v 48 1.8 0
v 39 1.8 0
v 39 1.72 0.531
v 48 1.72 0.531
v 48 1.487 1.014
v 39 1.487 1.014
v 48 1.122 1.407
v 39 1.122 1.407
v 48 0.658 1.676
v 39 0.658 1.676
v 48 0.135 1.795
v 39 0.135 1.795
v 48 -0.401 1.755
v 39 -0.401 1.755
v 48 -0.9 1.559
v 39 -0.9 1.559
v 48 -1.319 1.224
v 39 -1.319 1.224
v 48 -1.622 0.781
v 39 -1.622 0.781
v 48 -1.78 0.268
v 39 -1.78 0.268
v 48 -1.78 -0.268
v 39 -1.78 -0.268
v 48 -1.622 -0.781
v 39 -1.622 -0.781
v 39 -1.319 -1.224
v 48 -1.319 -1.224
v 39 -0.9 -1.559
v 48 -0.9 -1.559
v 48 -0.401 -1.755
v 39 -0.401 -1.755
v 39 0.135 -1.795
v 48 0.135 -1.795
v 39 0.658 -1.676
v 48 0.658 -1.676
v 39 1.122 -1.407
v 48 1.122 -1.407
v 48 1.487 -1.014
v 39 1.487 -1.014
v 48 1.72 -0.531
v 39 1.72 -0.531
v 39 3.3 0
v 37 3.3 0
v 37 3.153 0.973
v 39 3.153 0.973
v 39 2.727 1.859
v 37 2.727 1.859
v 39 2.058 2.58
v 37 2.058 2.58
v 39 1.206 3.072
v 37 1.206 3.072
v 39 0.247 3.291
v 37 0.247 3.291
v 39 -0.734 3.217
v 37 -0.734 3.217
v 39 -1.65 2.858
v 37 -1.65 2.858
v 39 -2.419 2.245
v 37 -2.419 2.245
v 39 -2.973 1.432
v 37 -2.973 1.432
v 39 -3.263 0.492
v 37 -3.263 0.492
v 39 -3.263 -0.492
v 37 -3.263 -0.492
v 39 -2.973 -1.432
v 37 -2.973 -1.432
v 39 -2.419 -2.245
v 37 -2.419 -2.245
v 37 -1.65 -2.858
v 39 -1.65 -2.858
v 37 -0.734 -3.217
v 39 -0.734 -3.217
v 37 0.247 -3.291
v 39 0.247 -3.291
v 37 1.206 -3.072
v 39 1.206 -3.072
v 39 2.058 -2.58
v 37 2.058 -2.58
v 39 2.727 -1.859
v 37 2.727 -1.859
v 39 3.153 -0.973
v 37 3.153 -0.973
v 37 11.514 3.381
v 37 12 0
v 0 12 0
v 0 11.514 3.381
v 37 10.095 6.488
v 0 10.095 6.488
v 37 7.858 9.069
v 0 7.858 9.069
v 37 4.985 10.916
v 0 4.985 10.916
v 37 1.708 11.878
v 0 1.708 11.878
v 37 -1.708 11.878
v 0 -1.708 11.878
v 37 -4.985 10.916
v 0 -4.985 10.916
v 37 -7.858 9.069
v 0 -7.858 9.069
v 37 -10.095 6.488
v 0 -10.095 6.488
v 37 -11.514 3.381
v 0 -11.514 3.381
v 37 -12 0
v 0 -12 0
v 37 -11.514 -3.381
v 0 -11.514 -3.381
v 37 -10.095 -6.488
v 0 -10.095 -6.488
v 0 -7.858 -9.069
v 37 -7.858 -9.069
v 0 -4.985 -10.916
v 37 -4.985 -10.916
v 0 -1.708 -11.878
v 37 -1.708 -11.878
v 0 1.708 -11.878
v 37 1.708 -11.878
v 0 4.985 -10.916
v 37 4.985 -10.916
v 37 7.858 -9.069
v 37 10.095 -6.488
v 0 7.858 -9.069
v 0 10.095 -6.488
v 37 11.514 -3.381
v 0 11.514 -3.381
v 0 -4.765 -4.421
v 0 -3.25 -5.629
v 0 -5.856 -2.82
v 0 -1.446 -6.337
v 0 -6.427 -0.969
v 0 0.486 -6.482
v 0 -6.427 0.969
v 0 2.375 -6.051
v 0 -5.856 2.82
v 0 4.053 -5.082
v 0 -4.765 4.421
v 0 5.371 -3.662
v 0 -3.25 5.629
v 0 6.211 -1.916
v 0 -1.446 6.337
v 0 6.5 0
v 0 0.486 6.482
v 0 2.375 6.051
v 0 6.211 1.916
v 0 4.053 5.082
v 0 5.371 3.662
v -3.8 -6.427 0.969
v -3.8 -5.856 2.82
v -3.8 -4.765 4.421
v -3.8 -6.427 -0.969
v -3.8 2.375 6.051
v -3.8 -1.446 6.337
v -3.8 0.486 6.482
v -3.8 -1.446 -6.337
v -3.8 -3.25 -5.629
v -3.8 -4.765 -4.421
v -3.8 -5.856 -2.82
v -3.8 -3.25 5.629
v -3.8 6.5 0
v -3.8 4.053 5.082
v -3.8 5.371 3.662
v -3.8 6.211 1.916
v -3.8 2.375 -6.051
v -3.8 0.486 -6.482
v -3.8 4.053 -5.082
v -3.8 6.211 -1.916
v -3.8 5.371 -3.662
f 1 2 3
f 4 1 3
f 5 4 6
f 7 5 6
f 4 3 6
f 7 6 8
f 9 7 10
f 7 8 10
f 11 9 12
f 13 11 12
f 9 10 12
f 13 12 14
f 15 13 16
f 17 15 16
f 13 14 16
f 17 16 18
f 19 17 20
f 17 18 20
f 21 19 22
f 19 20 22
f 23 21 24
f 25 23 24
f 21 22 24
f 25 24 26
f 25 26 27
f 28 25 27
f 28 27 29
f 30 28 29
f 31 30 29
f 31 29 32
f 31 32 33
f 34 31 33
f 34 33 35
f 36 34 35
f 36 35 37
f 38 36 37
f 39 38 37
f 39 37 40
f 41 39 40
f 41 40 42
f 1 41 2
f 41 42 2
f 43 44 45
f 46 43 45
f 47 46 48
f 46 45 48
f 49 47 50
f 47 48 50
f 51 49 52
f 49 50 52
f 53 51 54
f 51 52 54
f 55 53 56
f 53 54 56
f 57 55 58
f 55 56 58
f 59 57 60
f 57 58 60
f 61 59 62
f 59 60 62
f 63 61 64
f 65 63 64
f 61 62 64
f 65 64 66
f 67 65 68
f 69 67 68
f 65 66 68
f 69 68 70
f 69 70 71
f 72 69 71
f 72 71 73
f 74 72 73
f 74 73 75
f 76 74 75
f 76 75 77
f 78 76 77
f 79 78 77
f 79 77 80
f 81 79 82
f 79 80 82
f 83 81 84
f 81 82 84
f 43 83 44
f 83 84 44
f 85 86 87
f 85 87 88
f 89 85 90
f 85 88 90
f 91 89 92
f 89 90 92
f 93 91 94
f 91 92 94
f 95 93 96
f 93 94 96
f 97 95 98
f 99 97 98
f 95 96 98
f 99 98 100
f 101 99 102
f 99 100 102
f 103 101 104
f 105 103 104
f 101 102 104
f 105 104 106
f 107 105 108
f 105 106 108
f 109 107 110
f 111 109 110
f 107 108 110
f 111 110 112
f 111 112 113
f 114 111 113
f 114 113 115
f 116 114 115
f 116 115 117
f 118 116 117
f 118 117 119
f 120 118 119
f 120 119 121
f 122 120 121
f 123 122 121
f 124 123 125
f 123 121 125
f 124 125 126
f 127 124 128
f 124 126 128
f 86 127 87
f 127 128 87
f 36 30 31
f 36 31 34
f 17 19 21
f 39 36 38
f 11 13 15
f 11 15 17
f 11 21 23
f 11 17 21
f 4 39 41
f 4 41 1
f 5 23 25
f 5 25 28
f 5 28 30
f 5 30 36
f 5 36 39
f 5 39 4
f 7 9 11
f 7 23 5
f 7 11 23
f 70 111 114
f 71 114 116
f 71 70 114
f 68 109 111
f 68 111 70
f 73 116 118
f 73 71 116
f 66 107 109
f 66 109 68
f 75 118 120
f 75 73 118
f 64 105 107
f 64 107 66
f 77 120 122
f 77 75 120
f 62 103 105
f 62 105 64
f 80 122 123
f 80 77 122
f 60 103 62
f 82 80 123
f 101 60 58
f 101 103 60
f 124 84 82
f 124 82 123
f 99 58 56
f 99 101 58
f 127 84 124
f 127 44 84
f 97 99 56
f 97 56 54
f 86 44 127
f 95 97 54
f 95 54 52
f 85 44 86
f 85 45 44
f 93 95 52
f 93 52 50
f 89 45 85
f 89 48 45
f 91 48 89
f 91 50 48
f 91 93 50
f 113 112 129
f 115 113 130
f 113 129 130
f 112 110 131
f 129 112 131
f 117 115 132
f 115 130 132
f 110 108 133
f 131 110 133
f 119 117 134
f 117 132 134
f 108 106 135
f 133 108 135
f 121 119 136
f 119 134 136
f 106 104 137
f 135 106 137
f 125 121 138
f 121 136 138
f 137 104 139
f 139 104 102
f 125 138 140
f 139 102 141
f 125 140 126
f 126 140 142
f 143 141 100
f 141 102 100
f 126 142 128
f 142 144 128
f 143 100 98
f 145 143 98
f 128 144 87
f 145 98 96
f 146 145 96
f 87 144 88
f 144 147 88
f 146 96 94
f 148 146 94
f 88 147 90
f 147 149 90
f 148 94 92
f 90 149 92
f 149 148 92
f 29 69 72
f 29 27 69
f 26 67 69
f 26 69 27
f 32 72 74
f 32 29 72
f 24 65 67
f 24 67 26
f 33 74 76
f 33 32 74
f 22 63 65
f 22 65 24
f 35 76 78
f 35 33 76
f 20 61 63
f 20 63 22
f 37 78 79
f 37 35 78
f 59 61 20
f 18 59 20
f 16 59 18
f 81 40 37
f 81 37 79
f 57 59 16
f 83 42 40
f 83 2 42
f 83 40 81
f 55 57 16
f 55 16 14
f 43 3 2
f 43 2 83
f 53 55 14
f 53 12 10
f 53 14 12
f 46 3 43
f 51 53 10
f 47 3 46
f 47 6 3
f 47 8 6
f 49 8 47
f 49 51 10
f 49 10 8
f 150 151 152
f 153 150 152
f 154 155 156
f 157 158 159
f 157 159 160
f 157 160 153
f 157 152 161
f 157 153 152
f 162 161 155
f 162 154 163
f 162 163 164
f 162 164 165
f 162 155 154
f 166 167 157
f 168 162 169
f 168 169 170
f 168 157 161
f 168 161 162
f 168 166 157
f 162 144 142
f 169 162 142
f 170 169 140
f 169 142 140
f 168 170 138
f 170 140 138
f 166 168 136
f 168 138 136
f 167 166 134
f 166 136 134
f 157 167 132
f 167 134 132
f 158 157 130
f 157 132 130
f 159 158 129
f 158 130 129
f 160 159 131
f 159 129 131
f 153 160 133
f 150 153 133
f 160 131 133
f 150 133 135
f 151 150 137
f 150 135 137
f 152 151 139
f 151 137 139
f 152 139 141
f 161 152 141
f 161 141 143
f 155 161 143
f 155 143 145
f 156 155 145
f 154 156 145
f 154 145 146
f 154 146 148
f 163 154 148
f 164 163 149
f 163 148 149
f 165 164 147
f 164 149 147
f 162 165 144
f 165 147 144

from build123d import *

# Parameters (mm, degrees)
SKETCH_R     = 12
PAD_DEPTH    = 37
SKETCH001_R  = 3.3
PAD001_DEPTH = 2
SKETCH002_R  = 6.5
PAD002_DEPTH = 3.8
SKETCH003_R  = 1.8
PAD003_DEPTH = 9


with BuildPart() as part:
    # Sketch → Pad (new body)
    with BuildSketch(Plane.YZ):
        Circle(SKETCH_R)
    extrude(amount=PAD_DEPTH)

    # Sketch001 (on Face3 of Pad) → Pad001 (join)
    with BuildSketch(Plane.YZ.offset(37)):
        Circle(SKETCH001_R)
    extrude(amount=PAD001_DEPTH)

    # Sketch002 (on Face2 of Pad001) → Pad002 (join)
    with BuildSketch(Plane(origin=(0, 0, 0), x_dir=(0, 1, 0), z_dir=(-1, 0, 0))):
        Circle(SKETCH002_R)
    extrude(amount=PAD002_DEPTH)

    # Sketch003 (on Face7 of Pad002) → Pad003 (join)
    with BuildSketch(Plane.YZ.offset(39)):
        Circle(SKETCH003_R)
    extrude(amount=PAD003_DEPTH)


solid = part.part
